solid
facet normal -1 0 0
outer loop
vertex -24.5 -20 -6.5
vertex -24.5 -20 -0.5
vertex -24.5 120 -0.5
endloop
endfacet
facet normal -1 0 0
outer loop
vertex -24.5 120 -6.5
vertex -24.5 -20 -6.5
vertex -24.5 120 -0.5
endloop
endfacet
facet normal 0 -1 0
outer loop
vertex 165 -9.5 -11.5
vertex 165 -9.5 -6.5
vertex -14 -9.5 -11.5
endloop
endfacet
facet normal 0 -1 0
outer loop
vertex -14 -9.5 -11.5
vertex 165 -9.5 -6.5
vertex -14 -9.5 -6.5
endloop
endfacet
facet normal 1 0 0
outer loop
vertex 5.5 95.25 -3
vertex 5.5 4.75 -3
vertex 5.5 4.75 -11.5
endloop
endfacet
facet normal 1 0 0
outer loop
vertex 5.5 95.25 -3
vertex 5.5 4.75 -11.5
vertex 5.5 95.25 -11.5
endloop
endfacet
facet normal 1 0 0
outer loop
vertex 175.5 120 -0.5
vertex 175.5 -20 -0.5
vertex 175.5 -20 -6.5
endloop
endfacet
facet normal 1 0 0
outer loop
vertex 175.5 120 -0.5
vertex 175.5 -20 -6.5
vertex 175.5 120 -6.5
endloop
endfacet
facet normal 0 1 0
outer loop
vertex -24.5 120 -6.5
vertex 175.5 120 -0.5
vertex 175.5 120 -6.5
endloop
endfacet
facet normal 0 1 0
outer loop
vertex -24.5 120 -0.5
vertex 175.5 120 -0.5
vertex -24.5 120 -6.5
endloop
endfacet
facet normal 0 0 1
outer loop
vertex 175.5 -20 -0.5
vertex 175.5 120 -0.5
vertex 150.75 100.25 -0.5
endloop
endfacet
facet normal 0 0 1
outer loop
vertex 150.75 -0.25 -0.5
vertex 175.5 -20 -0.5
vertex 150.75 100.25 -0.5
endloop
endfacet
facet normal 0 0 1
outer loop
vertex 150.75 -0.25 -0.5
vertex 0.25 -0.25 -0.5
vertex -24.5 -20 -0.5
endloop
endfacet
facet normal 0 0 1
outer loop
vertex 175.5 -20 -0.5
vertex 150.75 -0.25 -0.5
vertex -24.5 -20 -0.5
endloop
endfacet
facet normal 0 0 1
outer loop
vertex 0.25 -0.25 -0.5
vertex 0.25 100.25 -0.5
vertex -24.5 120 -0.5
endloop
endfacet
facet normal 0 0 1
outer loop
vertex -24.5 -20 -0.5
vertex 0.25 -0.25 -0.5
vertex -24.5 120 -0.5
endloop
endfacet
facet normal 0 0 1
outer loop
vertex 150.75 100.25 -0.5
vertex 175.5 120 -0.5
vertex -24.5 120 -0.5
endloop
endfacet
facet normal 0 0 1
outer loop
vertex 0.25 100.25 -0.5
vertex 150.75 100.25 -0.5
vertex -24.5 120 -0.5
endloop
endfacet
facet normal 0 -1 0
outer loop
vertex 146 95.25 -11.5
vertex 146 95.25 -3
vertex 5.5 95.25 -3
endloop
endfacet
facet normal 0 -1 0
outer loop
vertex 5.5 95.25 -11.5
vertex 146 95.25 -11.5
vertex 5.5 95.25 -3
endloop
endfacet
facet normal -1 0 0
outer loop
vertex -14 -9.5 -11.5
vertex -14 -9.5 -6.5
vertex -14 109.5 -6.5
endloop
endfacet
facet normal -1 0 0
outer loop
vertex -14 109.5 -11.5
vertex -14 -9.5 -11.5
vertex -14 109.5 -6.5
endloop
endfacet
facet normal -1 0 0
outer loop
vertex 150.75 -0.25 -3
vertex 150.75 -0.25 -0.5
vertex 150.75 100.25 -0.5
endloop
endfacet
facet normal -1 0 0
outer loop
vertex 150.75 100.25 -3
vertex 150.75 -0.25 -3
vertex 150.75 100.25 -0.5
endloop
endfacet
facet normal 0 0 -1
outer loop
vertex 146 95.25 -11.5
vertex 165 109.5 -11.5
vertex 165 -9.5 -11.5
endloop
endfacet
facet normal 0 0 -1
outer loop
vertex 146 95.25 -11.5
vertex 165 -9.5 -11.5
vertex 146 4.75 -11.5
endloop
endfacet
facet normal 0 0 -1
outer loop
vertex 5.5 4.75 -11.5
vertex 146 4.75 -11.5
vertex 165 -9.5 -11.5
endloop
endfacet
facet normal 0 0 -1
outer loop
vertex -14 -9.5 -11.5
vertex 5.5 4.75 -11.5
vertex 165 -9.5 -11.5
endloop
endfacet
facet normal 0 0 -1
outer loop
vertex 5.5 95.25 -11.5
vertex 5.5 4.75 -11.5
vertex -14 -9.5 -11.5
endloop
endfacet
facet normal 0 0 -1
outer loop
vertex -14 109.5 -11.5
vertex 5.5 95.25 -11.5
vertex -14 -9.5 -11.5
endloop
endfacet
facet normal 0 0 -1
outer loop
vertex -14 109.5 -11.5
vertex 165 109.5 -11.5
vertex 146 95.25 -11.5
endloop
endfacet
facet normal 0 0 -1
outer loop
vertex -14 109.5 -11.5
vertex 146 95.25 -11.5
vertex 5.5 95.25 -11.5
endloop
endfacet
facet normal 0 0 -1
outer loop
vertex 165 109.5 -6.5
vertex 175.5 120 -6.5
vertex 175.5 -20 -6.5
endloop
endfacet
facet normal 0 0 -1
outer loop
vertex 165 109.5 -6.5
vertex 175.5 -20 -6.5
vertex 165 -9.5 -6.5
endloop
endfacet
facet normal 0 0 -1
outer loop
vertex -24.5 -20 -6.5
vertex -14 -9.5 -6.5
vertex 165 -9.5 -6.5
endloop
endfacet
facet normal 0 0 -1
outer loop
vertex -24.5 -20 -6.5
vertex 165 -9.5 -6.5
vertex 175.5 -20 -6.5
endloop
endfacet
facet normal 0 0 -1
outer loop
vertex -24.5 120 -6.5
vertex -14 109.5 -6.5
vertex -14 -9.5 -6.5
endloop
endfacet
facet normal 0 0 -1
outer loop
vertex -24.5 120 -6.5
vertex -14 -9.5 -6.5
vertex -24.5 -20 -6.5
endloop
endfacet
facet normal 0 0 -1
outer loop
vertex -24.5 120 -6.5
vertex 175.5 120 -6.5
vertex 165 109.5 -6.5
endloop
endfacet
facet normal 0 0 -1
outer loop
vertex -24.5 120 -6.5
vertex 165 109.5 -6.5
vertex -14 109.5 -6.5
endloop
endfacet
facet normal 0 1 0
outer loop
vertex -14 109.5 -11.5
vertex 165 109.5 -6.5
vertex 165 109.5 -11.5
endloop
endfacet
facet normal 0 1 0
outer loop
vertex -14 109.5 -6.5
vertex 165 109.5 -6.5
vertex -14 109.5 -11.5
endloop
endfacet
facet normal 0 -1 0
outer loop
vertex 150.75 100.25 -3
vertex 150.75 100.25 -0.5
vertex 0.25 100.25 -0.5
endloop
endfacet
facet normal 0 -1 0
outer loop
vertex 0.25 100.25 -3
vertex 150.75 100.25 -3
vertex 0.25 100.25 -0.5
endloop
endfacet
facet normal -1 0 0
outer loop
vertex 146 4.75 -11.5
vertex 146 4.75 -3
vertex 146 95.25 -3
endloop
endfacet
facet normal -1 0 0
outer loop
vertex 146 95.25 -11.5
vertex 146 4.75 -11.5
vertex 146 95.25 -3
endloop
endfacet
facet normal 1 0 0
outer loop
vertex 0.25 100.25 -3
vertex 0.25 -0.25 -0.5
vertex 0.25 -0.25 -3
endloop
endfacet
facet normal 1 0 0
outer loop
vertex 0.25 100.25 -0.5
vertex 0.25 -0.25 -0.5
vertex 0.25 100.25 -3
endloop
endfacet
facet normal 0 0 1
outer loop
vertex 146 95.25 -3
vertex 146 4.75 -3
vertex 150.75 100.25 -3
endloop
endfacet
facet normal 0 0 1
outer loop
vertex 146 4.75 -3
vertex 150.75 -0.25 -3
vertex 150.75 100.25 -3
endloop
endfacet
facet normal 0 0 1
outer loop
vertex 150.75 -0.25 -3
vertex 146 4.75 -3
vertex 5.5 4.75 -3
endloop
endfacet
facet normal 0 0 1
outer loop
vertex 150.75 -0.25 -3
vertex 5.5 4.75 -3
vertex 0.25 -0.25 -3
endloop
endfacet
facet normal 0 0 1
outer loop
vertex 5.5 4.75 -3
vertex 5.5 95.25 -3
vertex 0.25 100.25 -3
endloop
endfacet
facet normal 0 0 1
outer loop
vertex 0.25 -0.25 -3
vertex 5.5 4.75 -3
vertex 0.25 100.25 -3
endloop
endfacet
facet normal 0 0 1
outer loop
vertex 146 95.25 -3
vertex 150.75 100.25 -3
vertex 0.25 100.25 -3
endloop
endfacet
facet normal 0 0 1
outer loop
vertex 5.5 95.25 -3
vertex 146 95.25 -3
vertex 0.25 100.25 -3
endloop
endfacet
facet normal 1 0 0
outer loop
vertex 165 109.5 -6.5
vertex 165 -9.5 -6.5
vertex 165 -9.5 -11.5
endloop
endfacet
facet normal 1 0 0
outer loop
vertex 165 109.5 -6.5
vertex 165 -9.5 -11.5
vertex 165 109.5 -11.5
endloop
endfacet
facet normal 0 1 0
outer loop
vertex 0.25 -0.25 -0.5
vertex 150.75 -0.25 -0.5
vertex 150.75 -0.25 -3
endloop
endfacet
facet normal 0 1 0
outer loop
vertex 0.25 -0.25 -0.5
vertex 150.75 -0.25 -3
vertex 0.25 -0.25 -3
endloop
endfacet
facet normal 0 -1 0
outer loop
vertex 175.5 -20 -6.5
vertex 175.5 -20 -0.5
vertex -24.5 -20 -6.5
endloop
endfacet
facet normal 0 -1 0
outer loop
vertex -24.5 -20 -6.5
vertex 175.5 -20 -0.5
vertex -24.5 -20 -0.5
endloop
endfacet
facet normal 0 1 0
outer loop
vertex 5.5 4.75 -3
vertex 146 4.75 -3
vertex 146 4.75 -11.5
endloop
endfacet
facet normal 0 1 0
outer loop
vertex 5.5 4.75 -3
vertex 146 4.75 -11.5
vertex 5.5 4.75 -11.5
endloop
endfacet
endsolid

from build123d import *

# Parameters (mm, degrees)
SKETCH028_W             = 200
SKETCH028_H             = 140
PAD014_DEPTH            = 6
SKETCH026_W             = 179
SKETCH026_H             = 119
PAD015_DEPTH            = 11
SKETCH027_W             = 150.5
SKETCH027_H             = 100.5
POCKET012_DEPTH         = 2.5
SKETCH025_W             = 140.5
SKETCH025_H             = 90.5
POCKET011_DEPTH         = 12
BODY007_PLACEMENT_ANGLE = 180


with BuildPart() as part:
    # Sketch028 → Pad014 (new body)
    with BuildSketch(Plane.XY):
        with Locations((100, 70)):
            Rectangle(SKETCH028_W, SKETCH028_H)
    extrude(amount=PAD014_DEPTH)

    # Sketch026 → Pad015 (join)
    with BuildSketch(Plane.XY):
        with Locations((100, 70)):
            Rectangle(SKETCH026_W, SKETCH026_H)
    extrude(amount=PAD015_DEPTH)

    # Sketch027 → Pocket012 (cut)
    with BuildSketch(Plane.XY):
        with Locations((100, 70)):
            Rectangle(SKETCH027_W, SKETCH027_H)
    extrude(amount=POCKET012_DEPTH, mode=Mode.SUBTRACT)

    # Sketch025 → Pocket011 (cut)
    with BuildSketch(Plane.XY):
        with Locations((99.75, 70)):
            Rectangle(SKETCH025_W, SKETCH025_H)
    extrude(amount=POCKET011_DEPTH, mode=Mode.SUBTRACT)


with BuildPart() as part_1:
    # Body007 placement: moved
    add(part.part.moved(Location((175.5, -20, -0.5))).rotate(Axis((175.5, -20, -0.5), (0, 1, 0)), BODY007_PLACEMENT_ANGLE))


solid = part_1.part
